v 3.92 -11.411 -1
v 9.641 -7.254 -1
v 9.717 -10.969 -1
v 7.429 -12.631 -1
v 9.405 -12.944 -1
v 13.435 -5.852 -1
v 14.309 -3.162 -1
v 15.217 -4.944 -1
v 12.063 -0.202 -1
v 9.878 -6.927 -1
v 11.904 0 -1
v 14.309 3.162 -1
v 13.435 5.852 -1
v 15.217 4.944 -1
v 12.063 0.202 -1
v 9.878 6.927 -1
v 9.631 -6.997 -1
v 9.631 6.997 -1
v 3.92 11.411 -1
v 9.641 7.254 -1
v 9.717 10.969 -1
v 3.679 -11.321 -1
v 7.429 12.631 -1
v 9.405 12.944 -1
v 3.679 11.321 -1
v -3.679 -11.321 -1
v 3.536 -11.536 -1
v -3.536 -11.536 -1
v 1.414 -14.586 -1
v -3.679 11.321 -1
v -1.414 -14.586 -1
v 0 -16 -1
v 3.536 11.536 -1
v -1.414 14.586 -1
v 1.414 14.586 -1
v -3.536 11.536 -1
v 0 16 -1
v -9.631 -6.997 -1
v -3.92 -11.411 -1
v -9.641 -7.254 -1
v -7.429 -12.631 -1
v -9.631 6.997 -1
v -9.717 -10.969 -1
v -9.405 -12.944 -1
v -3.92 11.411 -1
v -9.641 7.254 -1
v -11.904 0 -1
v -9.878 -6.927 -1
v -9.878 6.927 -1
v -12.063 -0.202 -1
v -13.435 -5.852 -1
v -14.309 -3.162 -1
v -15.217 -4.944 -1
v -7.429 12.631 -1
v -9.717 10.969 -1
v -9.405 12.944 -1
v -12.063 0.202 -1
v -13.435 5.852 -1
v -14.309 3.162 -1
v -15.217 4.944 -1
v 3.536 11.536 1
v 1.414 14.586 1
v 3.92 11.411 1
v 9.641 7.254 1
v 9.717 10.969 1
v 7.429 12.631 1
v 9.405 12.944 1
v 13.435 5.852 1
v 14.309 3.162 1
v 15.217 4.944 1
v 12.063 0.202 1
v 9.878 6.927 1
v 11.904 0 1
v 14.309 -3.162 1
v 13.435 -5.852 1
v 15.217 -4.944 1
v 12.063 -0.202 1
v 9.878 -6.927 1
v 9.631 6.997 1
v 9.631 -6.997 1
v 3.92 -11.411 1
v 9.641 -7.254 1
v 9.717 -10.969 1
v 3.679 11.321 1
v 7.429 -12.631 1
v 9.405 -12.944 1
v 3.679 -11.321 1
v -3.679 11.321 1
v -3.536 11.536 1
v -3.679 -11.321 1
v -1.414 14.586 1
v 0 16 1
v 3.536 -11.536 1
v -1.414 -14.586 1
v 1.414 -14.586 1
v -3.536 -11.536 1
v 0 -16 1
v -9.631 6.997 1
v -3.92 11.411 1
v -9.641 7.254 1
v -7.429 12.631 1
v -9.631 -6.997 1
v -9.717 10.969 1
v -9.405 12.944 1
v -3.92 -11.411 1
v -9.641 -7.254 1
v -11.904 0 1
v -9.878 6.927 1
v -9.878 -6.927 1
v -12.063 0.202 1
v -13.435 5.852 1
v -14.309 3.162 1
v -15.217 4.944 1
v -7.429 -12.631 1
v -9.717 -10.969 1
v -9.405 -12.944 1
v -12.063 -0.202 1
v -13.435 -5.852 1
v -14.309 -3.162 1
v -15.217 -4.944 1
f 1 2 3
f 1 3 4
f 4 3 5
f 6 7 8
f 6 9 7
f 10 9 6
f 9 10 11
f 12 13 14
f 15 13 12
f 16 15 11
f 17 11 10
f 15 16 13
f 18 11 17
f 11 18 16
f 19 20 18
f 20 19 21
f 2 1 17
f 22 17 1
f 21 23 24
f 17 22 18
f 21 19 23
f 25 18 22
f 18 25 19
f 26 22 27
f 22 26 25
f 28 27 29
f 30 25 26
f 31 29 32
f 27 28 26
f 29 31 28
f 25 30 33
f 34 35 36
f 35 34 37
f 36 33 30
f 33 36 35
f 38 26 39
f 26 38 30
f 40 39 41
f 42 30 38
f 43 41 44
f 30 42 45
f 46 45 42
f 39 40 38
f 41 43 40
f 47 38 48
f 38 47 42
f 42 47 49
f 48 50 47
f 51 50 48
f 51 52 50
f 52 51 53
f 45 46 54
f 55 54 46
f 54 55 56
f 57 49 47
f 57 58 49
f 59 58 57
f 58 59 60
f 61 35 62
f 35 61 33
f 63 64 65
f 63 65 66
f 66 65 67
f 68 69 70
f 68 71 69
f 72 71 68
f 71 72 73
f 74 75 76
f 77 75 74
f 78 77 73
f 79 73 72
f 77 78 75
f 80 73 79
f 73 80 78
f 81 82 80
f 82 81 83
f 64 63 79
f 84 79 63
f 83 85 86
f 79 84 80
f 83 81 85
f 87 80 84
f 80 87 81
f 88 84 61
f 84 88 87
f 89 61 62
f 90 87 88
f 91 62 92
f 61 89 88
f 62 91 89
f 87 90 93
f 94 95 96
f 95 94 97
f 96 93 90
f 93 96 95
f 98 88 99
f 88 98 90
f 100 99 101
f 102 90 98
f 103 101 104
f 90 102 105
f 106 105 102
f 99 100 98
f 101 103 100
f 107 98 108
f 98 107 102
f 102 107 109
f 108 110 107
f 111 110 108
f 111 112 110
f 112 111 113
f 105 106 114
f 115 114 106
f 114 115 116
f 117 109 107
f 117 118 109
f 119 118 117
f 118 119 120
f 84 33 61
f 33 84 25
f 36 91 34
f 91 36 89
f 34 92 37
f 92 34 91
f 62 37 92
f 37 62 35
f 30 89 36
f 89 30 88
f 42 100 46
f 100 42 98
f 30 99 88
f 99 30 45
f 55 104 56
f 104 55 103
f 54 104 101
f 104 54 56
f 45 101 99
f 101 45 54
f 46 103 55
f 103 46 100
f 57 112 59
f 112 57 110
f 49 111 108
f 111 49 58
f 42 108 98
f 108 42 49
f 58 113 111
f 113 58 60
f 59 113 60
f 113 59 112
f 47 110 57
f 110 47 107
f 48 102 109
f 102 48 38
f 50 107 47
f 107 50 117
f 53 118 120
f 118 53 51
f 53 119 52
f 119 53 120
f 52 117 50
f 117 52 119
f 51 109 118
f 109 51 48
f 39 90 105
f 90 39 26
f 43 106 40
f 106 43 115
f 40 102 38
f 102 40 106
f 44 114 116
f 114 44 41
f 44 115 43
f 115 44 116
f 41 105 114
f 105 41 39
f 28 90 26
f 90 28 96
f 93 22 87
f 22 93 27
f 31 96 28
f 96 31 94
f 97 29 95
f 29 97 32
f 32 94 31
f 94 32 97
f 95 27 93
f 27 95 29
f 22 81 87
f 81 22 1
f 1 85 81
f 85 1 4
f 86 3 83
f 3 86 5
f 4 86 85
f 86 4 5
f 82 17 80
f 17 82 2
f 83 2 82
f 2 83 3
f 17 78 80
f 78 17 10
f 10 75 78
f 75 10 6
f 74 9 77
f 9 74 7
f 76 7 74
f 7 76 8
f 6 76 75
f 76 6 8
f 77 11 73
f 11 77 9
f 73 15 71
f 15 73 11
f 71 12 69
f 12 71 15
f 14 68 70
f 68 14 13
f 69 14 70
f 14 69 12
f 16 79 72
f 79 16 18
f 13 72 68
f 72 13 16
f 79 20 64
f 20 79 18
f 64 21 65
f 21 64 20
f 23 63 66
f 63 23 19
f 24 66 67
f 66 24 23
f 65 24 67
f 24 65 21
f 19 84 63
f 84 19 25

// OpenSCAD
// file: ../lib/utils.scad
///< Utilities

function rand_clr() = rands( 0,1,3 );

///< Length conversions
function in2mm( i ) = ( i * 25.4 ); 
function mm2in( m ) = ( m / 25.4 );

/// This is pulled from stackoverflow
/// https://stackoverflow.com/questions/45826208/openscad-rotating-around-a-particular-point

// rotate as per a, v, but around point pt
module rotate_about_pt(a, v, pt) {
    translate(pt)
        rotate(a,v)
            translate(-pt)
                children();   
}
// main file
///< Petals tutorial from all3dp
///< https://all3dp.com/2/openscad-tutorial-for-advanced-users-modules-functions/
use <../lib/utils.scad>

module petal(length=16, width=10, thickness=2){
     hull(){
	  translate([0,thickness/2,0])
	       cube(thickness, center=true);///Petal base
	  translate([0,length/2,0])
	       cylinder(r=width/2, h=thickness, center=true);///Petal middle
	  translate([0,length-hypo_to_side(thickness),0])
	       rotate([0,0,45])cube(thickness, center=true);///Petal tip
     }
}

function hypo_to_side(h) = sqrt( pow( h, 2 ) / 2 );


for( i=[0:10] ){
     clr=rands(0.0,1.0,4);
     rotate([0,0,i*360/10])color(clr)
	  petal();
     }
